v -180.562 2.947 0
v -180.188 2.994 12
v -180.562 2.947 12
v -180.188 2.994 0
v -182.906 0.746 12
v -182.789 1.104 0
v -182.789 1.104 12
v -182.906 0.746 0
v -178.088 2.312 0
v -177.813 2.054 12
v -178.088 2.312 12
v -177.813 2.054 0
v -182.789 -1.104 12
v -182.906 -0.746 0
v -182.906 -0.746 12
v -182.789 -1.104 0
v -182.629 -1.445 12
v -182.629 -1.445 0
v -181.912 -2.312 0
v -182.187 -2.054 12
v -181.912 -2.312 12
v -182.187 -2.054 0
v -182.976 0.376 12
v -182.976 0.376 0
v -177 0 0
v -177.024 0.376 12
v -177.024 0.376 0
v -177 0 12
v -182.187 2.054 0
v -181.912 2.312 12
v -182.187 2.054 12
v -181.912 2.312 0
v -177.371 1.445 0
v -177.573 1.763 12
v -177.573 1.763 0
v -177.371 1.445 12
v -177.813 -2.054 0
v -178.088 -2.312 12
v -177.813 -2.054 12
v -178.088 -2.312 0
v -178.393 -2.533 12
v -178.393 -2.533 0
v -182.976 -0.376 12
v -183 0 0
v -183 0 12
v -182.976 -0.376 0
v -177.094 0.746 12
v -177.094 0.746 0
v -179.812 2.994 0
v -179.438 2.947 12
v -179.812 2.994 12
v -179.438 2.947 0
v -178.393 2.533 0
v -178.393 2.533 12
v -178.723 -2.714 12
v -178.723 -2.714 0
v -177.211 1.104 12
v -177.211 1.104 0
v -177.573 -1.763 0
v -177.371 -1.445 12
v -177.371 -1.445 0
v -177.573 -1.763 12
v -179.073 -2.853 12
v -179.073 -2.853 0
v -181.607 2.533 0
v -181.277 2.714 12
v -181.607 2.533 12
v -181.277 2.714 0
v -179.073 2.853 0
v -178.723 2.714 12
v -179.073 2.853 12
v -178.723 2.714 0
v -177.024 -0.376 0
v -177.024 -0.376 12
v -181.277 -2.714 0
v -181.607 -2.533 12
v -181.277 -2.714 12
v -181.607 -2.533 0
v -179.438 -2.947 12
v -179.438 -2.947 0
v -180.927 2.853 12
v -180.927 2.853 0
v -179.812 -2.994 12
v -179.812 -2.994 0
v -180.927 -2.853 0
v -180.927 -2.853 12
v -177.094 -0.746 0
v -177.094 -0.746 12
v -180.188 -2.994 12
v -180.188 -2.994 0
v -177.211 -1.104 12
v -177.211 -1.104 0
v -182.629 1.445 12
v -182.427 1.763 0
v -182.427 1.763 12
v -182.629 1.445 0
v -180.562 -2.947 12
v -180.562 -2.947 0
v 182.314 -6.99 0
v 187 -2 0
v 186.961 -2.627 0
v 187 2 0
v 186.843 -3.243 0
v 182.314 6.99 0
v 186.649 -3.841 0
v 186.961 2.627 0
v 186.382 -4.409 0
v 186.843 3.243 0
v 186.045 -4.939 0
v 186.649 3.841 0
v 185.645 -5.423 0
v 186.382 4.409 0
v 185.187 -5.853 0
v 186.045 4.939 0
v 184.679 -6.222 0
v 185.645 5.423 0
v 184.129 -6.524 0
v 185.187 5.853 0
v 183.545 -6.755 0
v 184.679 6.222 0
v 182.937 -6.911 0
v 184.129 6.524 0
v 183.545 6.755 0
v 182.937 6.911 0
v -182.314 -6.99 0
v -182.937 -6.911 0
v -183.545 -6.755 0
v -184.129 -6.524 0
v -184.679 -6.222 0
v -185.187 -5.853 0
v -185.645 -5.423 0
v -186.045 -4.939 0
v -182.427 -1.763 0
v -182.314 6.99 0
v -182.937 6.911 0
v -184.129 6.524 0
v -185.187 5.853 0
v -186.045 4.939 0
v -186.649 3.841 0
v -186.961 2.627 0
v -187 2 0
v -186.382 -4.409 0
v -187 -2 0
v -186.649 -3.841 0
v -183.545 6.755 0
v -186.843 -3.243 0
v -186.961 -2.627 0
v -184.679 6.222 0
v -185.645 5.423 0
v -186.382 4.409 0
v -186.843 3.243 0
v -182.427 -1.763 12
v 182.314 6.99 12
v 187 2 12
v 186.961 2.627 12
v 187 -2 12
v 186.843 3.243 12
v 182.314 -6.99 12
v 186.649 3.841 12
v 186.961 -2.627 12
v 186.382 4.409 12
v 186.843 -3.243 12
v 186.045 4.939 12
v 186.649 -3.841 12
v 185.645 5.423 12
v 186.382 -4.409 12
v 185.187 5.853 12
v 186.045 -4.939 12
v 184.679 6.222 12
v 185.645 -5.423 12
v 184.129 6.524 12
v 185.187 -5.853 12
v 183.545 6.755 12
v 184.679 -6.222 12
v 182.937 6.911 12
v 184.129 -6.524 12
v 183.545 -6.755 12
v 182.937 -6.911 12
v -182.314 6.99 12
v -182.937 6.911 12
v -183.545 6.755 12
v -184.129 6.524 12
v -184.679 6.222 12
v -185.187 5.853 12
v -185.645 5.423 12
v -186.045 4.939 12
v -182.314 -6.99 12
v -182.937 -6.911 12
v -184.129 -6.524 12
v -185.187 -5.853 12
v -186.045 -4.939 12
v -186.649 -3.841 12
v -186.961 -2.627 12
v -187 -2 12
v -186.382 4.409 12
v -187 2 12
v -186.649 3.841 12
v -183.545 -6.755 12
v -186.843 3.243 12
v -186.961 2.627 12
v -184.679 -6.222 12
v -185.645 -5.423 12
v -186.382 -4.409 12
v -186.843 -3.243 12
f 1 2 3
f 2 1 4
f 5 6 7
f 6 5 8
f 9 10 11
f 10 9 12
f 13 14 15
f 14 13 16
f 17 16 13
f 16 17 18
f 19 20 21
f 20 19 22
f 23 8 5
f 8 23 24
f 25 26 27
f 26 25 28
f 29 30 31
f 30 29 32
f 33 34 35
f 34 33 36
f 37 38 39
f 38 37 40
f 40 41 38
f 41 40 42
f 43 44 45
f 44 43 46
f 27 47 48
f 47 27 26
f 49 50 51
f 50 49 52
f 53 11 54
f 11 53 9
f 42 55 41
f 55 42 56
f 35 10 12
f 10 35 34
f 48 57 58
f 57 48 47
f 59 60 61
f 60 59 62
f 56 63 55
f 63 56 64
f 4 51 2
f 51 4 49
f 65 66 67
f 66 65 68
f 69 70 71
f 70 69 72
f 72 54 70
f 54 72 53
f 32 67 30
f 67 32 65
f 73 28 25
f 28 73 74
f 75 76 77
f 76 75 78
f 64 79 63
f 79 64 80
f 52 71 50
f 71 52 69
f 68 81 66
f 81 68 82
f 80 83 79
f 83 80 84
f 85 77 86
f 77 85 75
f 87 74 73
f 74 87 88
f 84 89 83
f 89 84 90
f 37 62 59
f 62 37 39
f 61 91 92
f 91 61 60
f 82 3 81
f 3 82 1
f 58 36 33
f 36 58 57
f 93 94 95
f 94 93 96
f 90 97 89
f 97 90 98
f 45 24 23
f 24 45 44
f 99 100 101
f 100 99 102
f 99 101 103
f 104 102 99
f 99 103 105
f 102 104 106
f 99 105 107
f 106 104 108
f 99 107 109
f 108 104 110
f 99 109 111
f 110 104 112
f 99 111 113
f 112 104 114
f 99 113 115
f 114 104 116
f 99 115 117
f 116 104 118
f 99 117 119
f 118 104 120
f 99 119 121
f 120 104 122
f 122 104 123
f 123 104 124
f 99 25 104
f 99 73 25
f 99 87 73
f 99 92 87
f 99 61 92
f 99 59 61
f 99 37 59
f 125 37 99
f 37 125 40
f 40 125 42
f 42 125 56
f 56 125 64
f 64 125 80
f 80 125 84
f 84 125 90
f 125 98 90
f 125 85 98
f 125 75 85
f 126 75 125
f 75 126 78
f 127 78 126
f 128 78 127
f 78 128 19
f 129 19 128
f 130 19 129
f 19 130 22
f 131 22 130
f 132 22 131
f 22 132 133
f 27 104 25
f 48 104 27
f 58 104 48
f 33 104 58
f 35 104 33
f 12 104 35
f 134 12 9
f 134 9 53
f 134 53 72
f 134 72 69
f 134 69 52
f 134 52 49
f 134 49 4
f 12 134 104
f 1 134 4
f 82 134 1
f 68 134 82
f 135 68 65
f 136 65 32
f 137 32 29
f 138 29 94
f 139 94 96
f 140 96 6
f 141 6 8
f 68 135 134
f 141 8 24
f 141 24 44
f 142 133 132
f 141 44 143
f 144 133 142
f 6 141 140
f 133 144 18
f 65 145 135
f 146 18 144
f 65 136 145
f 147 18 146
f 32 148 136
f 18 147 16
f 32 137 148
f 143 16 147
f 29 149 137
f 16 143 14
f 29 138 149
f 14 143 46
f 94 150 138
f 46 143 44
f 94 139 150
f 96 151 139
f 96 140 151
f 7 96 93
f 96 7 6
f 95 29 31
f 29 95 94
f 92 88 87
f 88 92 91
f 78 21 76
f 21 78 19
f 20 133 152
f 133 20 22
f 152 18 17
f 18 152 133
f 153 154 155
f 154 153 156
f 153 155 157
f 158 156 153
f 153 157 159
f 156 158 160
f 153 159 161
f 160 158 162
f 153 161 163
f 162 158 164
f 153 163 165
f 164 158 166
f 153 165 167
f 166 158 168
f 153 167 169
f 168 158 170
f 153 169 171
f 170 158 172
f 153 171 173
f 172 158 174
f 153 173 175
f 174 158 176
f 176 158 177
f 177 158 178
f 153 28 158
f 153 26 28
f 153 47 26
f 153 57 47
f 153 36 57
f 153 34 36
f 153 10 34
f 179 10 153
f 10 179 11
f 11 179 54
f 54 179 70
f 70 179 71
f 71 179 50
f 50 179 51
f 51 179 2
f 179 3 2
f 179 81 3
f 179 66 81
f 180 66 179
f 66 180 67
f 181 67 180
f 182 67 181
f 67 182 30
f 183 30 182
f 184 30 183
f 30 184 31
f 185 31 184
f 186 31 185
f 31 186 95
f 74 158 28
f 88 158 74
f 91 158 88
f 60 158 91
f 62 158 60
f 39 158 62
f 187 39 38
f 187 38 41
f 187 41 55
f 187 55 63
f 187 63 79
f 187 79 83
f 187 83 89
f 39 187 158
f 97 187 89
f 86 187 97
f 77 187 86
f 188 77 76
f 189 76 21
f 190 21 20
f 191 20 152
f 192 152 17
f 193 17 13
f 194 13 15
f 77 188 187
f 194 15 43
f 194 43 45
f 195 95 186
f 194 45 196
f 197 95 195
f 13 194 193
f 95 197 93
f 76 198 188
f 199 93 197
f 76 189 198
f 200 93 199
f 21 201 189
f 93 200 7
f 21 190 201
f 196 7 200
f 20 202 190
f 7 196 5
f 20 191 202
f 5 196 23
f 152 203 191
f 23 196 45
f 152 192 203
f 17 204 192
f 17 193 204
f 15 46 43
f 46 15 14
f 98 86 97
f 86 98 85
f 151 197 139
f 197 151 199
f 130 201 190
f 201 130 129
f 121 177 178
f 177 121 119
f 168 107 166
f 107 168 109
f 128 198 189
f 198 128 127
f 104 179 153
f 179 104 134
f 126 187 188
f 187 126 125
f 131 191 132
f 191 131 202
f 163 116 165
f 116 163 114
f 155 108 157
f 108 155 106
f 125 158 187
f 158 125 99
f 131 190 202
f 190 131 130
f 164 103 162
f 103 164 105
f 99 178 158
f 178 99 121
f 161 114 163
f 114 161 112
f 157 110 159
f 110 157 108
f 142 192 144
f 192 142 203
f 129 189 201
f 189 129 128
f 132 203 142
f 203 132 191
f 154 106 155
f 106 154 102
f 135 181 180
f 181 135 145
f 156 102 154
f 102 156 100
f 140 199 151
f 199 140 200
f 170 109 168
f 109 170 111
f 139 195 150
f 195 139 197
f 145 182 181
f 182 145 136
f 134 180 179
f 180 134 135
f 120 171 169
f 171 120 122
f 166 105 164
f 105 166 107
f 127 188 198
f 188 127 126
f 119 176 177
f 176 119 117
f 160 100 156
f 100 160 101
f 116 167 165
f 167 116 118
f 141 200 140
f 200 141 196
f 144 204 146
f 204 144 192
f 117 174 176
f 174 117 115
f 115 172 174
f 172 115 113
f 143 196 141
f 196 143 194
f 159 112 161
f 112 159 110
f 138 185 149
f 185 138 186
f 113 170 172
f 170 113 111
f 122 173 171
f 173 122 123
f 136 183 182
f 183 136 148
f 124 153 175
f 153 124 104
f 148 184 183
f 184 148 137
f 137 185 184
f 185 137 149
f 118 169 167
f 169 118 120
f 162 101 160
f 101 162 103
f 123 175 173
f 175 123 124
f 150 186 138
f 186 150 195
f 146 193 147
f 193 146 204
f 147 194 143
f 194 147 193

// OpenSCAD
$fn = 50;


difference() {
	union() {
		hull() {
			translate(v = [-182.0000000000, 2.0000000000, 0]) {
				cylinder(h = 12, r = 5);
			}
			translate(v = [182.0000000000, 2.0000000000, 0]) {
				cylinder(h = 12, r = 5);
			}
			translate(v = [-182.0000000000, -2.0000000000, 0]) {
				cylinder(h = 12, r = 5);
			}
			translate(v = [182.0000000000, -2.0000000000, 0]) {
				cylinder(h = 12, r = 5);
			}
		}
	}
	union() {
		translate(v = [-180.0000000000, 0.0000000000, 0]) {
			cylinder(h = 12, r = 3.0000000000);
		}
		translate(v = [-180.0000000000, 0.0000000000, 0]) {
			cylinder(h = 12, r = 1.5000000000);
		}
		translate(v = [-180.0000000000, 0.0000000000, 0]) {
			cylinder(h = 12, r = 1.5000000000);
		}
		translate(v = [-180.0000000000, 0.0000000000, 0]) {
			cylinder(h = 12, r = 1.5000000000);
		}
	}
}
